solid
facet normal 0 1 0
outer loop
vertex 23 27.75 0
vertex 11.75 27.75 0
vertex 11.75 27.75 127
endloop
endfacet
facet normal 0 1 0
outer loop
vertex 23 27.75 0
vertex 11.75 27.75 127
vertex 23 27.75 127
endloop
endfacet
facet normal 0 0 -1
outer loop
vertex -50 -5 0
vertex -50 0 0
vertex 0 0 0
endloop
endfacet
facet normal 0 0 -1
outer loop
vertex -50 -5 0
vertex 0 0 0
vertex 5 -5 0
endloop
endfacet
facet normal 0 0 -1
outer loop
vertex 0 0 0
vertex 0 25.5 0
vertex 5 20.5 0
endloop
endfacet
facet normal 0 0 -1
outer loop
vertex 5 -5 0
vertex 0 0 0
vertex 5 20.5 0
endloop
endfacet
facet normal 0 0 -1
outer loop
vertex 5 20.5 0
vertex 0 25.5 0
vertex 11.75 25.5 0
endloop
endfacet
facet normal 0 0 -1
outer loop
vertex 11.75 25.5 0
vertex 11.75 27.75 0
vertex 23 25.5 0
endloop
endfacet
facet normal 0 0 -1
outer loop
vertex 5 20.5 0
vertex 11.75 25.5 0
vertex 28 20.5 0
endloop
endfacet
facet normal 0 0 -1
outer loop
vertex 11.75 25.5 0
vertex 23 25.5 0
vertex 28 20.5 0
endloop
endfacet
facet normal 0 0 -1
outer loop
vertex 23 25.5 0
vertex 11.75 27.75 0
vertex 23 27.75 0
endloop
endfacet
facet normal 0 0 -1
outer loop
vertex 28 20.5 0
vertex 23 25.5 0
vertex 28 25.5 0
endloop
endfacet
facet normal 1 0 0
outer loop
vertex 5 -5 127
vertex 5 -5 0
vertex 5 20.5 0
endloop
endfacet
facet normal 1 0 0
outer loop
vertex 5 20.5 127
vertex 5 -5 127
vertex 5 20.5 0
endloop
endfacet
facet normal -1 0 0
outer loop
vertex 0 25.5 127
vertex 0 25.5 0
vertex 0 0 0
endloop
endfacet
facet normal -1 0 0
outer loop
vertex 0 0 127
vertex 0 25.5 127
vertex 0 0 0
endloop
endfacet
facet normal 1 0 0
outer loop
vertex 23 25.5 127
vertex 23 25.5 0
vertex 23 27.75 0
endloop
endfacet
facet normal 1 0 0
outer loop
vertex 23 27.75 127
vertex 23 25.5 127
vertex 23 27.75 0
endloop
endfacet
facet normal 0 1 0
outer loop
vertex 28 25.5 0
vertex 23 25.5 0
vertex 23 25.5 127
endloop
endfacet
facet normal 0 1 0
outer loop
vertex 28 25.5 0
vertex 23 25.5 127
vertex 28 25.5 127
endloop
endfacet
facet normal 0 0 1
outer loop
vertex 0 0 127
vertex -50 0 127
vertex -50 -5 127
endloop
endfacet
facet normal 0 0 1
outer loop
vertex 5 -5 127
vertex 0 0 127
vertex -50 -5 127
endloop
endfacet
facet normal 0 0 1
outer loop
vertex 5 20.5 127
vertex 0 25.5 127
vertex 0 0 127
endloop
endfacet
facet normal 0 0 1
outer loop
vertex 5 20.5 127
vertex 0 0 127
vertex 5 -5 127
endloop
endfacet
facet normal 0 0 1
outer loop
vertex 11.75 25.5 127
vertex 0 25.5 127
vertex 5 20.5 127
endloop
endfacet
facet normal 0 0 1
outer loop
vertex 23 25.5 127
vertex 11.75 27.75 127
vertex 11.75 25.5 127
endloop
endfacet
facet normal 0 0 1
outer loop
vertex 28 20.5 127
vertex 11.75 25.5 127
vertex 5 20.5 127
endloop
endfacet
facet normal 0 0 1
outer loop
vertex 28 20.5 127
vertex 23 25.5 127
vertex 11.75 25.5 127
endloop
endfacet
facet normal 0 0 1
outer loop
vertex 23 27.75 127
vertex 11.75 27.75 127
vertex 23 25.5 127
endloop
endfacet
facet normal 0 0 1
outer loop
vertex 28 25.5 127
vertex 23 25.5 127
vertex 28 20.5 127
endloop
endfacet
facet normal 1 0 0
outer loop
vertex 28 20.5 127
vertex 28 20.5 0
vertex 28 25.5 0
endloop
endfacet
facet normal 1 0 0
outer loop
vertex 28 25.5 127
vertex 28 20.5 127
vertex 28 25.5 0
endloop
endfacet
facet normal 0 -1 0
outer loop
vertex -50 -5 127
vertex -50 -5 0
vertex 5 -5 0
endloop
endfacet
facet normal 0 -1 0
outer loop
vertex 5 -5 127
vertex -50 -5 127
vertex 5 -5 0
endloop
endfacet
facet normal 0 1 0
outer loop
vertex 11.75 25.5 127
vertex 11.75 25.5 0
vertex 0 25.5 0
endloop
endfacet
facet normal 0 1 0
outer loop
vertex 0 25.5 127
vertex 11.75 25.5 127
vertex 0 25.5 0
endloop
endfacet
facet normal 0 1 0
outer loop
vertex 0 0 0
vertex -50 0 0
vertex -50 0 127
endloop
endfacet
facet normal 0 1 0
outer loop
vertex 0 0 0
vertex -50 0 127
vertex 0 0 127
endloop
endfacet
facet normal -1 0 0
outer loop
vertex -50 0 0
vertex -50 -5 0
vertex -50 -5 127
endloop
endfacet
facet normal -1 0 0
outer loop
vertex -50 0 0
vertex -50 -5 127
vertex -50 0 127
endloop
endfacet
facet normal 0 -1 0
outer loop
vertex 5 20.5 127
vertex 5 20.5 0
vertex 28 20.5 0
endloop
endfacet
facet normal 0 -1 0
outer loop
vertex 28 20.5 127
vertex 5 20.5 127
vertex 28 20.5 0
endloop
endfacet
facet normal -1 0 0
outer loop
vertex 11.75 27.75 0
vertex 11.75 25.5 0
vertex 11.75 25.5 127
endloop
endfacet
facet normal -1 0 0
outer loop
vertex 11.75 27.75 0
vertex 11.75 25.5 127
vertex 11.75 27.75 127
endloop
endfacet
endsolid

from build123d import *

# Parameters (mm, degrees)
F0_W     = 50
F0_H     = 5
F0_W_2   = 11.25
F0_H_2   = 2.25
F0_W_3   = 5
F1_DEPTH = 127


with BuildPart() as f1:
    # F0 (on Top) → F1 (new body)
    with BuildSketch(Plane.XY):
        with Locations((-25, -2.5)):
            Rectangle(F0_W, F0_H)
        Polygon((0, 25.5), (0, 0), (0, -5), (5, -5), (5, 20.5), (5, 25.5), align=None)
        Polygon((11.75, 25.5), (5, 25.5), (5, 20.5), (23, 20.5), (23, 25.5), align=None)
        with Locations((17.375, 26.625)):
            Rectangle(F0_W_2, F0_H_2)
        with Locations((25.5, 23)):
            Rectangle(F0_W_3, F0_H)
    extrude(amount=F1_DEPTH)


solid = f1.part
